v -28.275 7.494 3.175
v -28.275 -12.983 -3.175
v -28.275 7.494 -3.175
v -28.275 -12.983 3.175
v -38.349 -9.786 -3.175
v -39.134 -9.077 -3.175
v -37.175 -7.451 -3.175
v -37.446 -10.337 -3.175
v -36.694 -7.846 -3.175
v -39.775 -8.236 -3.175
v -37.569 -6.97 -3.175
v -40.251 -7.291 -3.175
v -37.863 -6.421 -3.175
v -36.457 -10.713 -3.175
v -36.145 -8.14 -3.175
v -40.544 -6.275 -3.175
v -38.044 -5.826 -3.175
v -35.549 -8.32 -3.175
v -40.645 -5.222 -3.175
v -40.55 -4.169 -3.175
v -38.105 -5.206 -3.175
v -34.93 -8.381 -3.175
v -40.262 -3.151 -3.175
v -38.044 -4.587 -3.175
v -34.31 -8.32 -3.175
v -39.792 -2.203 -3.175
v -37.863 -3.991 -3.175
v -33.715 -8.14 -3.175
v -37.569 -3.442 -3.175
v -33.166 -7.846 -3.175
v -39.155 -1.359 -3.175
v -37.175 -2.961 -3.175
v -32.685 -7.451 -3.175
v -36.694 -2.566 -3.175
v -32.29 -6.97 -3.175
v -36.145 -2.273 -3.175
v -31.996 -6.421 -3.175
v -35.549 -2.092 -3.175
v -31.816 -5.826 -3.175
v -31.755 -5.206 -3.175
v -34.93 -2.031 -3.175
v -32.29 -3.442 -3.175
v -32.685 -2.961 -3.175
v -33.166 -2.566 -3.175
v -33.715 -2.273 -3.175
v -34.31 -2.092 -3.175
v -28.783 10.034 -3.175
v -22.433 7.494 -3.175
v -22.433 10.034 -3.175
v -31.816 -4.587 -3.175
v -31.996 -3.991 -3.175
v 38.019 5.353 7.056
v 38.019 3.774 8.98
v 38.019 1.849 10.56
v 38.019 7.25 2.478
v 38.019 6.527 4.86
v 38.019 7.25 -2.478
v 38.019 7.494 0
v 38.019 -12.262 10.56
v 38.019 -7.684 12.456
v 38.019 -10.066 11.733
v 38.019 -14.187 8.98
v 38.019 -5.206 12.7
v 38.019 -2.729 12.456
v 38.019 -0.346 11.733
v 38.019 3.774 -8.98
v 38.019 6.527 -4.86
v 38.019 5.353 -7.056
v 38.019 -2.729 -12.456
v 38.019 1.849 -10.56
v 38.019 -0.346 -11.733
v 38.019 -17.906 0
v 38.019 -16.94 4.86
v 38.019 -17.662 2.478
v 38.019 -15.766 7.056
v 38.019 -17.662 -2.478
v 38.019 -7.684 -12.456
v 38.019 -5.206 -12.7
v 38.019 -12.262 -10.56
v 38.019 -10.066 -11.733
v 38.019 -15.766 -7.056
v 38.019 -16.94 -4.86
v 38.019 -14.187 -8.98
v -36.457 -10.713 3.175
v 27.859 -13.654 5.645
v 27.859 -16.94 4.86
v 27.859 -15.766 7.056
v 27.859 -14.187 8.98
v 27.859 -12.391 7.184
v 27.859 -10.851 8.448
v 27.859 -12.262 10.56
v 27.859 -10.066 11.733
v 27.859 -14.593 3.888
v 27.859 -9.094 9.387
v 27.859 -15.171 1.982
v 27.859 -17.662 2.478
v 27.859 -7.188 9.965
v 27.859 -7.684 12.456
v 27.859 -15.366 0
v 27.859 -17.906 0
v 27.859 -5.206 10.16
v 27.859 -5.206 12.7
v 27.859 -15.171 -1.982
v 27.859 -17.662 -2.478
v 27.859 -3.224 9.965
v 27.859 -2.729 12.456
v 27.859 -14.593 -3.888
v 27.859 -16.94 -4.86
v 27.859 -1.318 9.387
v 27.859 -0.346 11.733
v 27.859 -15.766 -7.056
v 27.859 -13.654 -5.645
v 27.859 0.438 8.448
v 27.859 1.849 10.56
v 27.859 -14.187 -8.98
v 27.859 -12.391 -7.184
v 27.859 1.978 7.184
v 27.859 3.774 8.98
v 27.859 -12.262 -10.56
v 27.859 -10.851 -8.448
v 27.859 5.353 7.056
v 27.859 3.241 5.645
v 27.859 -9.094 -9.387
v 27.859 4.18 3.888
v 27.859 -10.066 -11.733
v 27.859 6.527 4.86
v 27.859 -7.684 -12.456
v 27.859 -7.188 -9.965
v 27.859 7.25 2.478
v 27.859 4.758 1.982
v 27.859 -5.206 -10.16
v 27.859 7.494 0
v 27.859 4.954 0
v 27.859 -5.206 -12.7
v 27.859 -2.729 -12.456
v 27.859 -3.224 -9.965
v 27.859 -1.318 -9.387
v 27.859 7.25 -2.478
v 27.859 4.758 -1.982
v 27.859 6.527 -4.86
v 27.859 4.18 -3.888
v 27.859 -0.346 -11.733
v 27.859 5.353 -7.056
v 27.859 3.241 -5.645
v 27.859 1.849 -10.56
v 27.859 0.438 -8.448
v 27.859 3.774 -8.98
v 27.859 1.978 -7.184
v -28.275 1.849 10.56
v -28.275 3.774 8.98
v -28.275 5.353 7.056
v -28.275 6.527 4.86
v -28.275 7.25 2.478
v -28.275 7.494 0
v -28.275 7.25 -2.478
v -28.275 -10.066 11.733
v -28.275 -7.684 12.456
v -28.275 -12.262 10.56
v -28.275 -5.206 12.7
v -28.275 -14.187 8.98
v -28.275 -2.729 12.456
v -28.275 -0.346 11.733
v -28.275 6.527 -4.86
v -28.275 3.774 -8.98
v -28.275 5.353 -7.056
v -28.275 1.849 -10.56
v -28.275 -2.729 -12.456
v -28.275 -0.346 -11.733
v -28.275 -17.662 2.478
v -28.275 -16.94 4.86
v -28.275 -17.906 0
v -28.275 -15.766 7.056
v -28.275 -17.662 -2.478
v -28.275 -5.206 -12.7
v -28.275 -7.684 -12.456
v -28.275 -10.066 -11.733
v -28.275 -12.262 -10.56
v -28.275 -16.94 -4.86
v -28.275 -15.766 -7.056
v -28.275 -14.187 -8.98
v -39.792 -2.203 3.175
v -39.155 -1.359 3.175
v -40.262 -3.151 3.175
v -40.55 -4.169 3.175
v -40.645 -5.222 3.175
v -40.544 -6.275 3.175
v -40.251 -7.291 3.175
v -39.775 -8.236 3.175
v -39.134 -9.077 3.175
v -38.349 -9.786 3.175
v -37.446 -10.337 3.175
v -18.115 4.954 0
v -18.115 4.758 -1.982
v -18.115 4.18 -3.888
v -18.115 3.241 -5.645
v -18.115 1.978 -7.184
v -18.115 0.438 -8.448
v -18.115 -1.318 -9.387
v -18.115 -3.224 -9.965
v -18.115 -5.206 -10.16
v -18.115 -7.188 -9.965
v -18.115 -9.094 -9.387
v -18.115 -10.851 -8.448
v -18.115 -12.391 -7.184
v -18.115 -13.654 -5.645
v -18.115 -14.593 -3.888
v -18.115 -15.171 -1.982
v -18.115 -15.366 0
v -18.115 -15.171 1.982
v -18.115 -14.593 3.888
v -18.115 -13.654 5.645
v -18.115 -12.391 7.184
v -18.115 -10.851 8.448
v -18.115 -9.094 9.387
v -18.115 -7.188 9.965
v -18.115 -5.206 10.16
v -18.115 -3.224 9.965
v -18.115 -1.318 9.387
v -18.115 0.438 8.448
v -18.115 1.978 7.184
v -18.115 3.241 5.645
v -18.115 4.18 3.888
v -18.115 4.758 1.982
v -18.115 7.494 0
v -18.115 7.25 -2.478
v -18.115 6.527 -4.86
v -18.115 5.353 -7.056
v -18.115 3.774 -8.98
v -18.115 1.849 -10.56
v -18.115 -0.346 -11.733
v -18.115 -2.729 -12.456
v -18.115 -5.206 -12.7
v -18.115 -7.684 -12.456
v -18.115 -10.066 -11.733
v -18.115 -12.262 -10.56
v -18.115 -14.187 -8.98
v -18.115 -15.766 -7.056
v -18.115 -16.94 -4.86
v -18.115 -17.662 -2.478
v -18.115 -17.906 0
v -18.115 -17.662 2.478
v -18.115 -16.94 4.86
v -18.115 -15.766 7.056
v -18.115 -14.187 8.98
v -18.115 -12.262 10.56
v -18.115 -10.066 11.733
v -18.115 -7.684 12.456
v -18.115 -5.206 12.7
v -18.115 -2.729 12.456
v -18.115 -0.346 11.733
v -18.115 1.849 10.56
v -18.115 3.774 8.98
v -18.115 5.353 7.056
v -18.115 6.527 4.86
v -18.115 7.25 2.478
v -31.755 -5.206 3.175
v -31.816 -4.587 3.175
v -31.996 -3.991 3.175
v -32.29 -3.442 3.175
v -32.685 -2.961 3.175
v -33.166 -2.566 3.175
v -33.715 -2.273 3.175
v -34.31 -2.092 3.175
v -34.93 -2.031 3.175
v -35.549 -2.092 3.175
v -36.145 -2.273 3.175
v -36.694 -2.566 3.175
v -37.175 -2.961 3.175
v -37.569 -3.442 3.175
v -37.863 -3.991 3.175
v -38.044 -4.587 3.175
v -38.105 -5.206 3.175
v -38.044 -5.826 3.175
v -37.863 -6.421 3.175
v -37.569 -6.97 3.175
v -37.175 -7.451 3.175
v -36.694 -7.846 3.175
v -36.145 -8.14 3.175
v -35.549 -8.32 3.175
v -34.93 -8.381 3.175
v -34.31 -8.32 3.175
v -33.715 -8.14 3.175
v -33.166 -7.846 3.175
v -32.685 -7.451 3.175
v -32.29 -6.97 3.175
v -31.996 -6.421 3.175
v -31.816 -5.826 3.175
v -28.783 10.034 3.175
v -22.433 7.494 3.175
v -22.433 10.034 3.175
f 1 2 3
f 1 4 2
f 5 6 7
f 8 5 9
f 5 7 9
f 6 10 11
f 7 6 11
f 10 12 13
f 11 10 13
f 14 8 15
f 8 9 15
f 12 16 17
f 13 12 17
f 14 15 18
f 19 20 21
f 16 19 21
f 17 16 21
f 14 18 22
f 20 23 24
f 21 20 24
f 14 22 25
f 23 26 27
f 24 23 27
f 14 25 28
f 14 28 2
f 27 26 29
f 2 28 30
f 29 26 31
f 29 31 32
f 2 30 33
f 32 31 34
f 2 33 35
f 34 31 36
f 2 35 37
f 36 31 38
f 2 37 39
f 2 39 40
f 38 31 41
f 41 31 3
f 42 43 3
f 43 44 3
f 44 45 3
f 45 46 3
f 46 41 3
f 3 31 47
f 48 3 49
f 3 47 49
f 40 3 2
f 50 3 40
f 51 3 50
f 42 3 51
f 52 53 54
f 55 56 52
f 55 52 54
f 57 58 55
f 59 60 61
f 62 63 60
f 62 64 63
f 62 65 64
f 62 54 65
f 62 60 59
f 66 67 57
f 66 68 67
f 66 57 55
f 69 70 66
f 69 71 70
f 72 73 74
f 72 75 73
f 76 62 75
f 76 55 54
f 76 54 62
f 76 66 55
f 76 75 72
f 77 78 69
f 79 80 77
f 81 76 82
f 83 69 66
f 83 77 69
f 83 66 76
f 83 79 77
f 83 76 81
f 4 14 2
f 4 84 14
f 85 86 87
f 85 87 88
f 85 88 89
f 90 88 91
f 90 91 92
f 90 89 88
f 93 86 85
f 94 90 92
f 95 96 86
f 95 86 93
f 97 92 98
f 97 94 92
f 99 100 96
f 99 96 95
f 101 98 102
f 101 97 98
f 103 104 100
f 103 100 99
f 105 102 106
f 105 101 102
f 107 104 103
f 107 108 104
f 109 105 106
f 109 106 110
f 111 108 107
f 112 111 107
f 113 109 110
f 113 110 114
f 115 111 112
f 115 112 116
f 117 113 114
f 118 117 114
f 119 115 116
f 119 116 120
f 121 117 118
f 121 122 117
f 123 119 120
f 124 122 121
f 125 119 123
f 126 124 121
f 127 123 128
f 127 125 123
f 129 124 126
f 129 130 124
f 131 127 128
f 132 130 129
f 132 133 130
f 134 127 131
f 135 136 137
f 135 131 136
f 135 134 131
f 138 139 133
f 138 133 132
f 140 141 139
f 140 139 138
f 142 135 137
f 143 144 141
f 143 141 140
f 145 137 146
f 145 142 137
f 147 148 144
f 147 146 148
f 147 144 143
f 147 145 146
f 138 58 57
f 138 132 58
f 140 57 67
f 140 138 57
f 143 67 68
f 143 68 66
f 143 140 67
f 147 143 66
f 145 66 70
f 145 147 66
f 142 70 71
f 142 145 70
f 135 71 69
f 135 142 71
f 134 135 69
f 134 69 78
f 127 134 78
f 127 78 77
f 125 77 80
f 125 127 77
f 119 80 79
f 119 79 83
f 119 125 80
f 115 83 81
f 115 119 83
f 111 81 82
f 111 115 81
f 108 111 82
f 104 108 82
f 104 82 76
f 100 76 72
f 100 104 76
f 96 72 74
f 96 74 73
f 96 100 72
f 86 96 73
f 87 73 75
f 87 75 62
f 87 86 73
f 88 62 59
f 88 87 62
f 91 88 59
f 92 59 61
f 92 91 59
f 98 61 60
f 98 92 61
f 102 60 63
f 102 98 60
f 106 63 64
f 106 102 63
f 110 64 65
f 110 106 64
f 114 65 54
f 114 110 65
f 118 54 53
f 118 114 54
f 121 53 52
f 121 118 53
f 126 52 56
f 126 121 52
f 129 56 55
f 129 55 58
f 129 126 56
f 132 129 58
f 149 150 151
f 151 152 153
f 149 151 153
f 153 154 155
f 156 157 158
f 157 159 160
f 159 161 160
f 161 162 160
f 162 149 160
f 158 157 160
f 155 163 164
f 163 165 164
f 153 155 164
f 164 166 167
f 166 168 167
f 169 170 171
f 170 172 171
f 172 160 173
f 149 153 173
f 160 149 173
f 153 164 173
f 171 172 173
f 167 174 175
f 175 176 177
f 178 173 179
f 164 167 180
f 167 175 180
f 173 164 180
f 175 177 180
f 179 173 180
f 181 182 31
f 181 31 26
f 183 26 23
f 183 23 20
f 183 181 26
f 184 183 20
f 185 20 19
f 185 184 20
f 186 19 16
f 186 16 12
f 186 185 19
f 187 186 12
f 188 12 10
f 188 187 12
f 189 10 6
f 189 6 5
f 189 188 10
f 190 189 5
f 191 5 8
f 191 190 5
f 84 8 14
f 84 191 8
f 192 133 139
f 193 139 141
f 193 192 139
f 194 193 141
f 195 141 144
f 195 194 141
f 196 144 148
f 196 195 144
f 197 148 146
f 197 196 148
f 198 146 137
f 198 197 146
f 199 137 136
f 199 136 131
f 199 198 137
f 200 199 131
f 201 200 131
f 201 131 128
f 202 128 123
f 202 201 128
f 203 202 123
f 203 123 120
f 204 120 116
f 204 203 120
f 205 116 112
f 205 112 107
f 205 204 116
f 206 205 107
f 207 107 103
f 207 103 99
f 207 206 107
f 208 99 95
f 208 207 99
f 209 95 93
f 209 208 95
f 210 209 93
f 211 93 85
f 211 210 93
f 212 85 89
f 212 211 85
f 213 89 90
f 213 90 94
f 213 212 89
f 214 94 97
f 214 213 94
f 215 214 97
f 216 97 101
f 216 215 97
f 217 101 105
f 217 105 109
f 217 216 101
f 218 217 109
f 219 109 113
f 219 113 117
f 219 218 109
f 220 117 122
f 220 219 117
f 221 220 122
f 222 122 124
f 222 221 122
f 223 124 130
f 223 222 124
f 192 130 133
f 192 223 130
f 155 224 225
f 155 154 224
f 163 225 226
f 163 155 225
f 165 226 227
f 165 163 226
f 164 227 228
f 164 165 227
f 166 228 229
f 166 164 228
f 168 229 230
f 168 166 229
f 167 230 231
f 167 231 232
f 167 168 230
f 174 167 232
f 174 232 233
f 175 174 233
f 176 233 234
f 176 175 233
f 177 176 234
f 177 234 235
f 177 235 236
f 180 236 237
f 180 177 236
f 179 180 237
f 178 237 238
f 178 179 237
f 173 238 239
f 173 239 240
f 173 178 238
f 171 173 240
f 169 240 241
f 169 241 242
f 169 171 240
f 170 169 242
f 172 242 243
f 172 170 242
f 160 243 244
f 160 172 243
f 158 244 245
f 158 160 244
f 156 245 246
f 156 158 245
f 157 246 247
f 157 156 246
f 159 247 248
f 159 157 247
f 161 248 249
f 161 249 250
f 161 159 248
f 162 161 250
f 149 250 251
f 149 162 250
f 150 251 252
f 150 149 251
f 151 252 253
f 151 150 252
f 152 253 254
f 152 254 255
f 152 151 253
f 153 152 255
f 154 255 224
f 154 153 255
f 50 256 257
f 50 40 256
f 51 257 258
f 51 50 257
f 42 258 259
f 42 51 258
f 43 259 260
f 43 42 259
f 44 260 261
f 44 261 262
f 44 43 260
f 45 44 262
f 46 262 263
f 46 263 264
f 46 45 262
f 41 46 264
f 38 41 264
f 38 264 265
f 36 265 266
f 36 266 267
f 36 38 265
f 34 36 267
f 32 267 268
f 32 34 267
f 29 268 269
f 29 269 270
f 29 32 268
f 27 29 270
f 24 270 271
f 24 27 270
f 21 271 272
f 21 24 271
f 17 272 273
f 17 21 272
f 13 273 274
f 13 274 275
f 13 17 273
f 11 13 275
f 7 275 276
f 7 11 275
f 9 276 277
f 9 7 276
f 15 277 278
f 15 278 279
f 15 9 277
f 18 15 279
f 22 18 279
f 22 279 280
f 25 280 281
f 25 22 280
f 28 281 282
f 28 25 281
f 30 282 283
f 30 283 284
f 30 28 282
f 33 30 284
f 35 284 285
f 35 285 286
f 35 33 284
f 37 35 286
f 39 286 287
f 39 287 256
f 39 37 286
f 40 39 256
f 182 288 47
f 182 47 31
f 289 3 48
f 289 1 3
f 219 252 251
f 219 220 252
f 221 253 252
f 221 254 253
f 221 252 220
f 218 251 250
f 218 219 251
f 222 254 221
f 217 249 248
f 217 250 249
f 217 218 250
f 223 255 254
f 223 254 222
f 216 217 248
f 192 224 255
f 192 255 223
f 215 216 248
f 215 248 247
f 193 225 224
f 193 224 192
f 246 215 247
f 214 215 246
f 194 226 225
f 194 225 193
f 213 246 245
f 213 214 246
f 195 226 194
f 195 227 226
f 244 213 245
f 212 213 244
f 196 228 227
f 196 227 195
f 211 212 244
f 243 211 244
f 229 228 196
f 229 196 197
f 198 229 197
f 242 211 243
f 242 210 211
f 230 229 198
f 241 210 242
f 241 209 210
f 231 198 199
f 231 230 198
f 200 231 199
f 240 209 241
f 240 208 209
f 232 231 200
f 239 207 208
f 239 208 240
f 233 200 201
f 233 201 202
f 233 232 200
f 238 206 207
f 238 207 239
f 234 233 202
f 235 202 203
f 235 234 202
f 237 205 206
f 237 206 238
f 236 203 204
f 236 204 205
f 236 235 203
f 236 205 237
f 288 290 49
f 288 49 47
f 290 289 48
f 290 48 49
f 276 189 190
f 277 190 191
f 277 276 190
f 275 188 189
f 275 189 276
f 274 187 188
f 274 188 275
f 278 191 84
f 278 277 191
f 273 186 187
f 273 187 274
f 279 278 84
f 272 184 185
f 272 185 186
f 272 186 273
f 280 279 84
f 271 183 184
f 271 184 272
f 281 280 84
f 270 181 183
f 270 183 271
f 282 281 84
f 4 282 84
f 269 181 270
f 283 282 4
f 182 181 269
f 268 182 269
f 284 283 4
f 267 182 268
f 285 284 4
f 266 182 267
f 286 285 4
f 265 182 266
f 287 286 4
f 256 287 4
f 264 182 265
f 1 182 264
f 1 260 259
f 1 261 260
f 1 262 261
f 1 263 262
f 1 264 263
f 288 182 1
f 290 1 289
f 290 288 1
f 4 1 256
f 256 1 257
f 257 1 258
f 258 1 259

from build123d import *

# Parameters (mm, degrees)
F0_W     = 5.842
F0_H     = 12.7
F0_R     = 3.175
F2_DEPTH = 3.175


with BuildPart() as f1:
    # F0 (on Top) → F1 (revolve)
    with BuildSketch(Plane.XY):
        Polygon((-22.432768, 7.493692), (-22.432768, -5.206308), (38.019232, -5.206308), (38.019232, 7.493692), (27.859232, 7.493692), (27.859232, 4.953692), (-18.114768, 4.953692), (-18.114768, 7.493692), align=None)
        with Locations((-25.353768, 1.143692)):
            Rectangle(F0_W, F0_H)
    revolve(axis=Axis((4.872232, -5.206308, 0), (-1, 0, 0)))


with BuildPart() as f2:
    # F0 (on Top) → F2 (new body, symmetric)
    with BuildSketch(Plane.XY):
        with BuildLine():
            Line((-29.214568, -5.206308), (-28.274768, -5.206308))
            Line((-28.274768, -5.206308), (-28.274768, 7.493692))
            Line((-28.274768, 7.493692), (-22.432768, 7.493692))
            Line((-22.432768, 7.493692), (-22.432768, 10.033692))
            Line((-22.432768, 10.033692), (-28.782768, 10.033692))
            Line((-28.782768, 10.033692), (-39.155398, -1.358765))
            ThreePointArc((-39.155398, -1.358765), (-32.866729, 0.123412), (-29.214568, -5.206308))
        make_face()
        with BuildLine():
            ThreePointArc((-36.457431, -10.713291), (-31.470559, -9.755647), (-29.214568, -5.206308))
            ThreePointArc((-29.214568, -5.206308), (-32.866729, 0.123412), (-39.155398, -1.358765))
            ThreePointArc((-39.155398, -1.358765), (-40.420746, -6.790035), (-36.457431, -10.713291))
        make_face()
        with Locations((-34.929568, -5.206308)):
            Circle(F0_R, mode=Mode.SUBTRACT)
        with BuildLine():
            Line((-28.274768, -12.983497), (-28.274768, -5.206308))
            Line((-28.274768, -5.206308), (-29.214568, -5.206308))
            ThreePointArc((-29.214568, -5.206308), (-31.470559, -9.755647), (-36.457431, -10.713291))
            Line((-36.457431, -10.713291), (-28.274768, -12.983497))
        make_face()
    extrude(amount=F2_DEPTH, both=True)


solid = Compound([f1.part, f2.part])
